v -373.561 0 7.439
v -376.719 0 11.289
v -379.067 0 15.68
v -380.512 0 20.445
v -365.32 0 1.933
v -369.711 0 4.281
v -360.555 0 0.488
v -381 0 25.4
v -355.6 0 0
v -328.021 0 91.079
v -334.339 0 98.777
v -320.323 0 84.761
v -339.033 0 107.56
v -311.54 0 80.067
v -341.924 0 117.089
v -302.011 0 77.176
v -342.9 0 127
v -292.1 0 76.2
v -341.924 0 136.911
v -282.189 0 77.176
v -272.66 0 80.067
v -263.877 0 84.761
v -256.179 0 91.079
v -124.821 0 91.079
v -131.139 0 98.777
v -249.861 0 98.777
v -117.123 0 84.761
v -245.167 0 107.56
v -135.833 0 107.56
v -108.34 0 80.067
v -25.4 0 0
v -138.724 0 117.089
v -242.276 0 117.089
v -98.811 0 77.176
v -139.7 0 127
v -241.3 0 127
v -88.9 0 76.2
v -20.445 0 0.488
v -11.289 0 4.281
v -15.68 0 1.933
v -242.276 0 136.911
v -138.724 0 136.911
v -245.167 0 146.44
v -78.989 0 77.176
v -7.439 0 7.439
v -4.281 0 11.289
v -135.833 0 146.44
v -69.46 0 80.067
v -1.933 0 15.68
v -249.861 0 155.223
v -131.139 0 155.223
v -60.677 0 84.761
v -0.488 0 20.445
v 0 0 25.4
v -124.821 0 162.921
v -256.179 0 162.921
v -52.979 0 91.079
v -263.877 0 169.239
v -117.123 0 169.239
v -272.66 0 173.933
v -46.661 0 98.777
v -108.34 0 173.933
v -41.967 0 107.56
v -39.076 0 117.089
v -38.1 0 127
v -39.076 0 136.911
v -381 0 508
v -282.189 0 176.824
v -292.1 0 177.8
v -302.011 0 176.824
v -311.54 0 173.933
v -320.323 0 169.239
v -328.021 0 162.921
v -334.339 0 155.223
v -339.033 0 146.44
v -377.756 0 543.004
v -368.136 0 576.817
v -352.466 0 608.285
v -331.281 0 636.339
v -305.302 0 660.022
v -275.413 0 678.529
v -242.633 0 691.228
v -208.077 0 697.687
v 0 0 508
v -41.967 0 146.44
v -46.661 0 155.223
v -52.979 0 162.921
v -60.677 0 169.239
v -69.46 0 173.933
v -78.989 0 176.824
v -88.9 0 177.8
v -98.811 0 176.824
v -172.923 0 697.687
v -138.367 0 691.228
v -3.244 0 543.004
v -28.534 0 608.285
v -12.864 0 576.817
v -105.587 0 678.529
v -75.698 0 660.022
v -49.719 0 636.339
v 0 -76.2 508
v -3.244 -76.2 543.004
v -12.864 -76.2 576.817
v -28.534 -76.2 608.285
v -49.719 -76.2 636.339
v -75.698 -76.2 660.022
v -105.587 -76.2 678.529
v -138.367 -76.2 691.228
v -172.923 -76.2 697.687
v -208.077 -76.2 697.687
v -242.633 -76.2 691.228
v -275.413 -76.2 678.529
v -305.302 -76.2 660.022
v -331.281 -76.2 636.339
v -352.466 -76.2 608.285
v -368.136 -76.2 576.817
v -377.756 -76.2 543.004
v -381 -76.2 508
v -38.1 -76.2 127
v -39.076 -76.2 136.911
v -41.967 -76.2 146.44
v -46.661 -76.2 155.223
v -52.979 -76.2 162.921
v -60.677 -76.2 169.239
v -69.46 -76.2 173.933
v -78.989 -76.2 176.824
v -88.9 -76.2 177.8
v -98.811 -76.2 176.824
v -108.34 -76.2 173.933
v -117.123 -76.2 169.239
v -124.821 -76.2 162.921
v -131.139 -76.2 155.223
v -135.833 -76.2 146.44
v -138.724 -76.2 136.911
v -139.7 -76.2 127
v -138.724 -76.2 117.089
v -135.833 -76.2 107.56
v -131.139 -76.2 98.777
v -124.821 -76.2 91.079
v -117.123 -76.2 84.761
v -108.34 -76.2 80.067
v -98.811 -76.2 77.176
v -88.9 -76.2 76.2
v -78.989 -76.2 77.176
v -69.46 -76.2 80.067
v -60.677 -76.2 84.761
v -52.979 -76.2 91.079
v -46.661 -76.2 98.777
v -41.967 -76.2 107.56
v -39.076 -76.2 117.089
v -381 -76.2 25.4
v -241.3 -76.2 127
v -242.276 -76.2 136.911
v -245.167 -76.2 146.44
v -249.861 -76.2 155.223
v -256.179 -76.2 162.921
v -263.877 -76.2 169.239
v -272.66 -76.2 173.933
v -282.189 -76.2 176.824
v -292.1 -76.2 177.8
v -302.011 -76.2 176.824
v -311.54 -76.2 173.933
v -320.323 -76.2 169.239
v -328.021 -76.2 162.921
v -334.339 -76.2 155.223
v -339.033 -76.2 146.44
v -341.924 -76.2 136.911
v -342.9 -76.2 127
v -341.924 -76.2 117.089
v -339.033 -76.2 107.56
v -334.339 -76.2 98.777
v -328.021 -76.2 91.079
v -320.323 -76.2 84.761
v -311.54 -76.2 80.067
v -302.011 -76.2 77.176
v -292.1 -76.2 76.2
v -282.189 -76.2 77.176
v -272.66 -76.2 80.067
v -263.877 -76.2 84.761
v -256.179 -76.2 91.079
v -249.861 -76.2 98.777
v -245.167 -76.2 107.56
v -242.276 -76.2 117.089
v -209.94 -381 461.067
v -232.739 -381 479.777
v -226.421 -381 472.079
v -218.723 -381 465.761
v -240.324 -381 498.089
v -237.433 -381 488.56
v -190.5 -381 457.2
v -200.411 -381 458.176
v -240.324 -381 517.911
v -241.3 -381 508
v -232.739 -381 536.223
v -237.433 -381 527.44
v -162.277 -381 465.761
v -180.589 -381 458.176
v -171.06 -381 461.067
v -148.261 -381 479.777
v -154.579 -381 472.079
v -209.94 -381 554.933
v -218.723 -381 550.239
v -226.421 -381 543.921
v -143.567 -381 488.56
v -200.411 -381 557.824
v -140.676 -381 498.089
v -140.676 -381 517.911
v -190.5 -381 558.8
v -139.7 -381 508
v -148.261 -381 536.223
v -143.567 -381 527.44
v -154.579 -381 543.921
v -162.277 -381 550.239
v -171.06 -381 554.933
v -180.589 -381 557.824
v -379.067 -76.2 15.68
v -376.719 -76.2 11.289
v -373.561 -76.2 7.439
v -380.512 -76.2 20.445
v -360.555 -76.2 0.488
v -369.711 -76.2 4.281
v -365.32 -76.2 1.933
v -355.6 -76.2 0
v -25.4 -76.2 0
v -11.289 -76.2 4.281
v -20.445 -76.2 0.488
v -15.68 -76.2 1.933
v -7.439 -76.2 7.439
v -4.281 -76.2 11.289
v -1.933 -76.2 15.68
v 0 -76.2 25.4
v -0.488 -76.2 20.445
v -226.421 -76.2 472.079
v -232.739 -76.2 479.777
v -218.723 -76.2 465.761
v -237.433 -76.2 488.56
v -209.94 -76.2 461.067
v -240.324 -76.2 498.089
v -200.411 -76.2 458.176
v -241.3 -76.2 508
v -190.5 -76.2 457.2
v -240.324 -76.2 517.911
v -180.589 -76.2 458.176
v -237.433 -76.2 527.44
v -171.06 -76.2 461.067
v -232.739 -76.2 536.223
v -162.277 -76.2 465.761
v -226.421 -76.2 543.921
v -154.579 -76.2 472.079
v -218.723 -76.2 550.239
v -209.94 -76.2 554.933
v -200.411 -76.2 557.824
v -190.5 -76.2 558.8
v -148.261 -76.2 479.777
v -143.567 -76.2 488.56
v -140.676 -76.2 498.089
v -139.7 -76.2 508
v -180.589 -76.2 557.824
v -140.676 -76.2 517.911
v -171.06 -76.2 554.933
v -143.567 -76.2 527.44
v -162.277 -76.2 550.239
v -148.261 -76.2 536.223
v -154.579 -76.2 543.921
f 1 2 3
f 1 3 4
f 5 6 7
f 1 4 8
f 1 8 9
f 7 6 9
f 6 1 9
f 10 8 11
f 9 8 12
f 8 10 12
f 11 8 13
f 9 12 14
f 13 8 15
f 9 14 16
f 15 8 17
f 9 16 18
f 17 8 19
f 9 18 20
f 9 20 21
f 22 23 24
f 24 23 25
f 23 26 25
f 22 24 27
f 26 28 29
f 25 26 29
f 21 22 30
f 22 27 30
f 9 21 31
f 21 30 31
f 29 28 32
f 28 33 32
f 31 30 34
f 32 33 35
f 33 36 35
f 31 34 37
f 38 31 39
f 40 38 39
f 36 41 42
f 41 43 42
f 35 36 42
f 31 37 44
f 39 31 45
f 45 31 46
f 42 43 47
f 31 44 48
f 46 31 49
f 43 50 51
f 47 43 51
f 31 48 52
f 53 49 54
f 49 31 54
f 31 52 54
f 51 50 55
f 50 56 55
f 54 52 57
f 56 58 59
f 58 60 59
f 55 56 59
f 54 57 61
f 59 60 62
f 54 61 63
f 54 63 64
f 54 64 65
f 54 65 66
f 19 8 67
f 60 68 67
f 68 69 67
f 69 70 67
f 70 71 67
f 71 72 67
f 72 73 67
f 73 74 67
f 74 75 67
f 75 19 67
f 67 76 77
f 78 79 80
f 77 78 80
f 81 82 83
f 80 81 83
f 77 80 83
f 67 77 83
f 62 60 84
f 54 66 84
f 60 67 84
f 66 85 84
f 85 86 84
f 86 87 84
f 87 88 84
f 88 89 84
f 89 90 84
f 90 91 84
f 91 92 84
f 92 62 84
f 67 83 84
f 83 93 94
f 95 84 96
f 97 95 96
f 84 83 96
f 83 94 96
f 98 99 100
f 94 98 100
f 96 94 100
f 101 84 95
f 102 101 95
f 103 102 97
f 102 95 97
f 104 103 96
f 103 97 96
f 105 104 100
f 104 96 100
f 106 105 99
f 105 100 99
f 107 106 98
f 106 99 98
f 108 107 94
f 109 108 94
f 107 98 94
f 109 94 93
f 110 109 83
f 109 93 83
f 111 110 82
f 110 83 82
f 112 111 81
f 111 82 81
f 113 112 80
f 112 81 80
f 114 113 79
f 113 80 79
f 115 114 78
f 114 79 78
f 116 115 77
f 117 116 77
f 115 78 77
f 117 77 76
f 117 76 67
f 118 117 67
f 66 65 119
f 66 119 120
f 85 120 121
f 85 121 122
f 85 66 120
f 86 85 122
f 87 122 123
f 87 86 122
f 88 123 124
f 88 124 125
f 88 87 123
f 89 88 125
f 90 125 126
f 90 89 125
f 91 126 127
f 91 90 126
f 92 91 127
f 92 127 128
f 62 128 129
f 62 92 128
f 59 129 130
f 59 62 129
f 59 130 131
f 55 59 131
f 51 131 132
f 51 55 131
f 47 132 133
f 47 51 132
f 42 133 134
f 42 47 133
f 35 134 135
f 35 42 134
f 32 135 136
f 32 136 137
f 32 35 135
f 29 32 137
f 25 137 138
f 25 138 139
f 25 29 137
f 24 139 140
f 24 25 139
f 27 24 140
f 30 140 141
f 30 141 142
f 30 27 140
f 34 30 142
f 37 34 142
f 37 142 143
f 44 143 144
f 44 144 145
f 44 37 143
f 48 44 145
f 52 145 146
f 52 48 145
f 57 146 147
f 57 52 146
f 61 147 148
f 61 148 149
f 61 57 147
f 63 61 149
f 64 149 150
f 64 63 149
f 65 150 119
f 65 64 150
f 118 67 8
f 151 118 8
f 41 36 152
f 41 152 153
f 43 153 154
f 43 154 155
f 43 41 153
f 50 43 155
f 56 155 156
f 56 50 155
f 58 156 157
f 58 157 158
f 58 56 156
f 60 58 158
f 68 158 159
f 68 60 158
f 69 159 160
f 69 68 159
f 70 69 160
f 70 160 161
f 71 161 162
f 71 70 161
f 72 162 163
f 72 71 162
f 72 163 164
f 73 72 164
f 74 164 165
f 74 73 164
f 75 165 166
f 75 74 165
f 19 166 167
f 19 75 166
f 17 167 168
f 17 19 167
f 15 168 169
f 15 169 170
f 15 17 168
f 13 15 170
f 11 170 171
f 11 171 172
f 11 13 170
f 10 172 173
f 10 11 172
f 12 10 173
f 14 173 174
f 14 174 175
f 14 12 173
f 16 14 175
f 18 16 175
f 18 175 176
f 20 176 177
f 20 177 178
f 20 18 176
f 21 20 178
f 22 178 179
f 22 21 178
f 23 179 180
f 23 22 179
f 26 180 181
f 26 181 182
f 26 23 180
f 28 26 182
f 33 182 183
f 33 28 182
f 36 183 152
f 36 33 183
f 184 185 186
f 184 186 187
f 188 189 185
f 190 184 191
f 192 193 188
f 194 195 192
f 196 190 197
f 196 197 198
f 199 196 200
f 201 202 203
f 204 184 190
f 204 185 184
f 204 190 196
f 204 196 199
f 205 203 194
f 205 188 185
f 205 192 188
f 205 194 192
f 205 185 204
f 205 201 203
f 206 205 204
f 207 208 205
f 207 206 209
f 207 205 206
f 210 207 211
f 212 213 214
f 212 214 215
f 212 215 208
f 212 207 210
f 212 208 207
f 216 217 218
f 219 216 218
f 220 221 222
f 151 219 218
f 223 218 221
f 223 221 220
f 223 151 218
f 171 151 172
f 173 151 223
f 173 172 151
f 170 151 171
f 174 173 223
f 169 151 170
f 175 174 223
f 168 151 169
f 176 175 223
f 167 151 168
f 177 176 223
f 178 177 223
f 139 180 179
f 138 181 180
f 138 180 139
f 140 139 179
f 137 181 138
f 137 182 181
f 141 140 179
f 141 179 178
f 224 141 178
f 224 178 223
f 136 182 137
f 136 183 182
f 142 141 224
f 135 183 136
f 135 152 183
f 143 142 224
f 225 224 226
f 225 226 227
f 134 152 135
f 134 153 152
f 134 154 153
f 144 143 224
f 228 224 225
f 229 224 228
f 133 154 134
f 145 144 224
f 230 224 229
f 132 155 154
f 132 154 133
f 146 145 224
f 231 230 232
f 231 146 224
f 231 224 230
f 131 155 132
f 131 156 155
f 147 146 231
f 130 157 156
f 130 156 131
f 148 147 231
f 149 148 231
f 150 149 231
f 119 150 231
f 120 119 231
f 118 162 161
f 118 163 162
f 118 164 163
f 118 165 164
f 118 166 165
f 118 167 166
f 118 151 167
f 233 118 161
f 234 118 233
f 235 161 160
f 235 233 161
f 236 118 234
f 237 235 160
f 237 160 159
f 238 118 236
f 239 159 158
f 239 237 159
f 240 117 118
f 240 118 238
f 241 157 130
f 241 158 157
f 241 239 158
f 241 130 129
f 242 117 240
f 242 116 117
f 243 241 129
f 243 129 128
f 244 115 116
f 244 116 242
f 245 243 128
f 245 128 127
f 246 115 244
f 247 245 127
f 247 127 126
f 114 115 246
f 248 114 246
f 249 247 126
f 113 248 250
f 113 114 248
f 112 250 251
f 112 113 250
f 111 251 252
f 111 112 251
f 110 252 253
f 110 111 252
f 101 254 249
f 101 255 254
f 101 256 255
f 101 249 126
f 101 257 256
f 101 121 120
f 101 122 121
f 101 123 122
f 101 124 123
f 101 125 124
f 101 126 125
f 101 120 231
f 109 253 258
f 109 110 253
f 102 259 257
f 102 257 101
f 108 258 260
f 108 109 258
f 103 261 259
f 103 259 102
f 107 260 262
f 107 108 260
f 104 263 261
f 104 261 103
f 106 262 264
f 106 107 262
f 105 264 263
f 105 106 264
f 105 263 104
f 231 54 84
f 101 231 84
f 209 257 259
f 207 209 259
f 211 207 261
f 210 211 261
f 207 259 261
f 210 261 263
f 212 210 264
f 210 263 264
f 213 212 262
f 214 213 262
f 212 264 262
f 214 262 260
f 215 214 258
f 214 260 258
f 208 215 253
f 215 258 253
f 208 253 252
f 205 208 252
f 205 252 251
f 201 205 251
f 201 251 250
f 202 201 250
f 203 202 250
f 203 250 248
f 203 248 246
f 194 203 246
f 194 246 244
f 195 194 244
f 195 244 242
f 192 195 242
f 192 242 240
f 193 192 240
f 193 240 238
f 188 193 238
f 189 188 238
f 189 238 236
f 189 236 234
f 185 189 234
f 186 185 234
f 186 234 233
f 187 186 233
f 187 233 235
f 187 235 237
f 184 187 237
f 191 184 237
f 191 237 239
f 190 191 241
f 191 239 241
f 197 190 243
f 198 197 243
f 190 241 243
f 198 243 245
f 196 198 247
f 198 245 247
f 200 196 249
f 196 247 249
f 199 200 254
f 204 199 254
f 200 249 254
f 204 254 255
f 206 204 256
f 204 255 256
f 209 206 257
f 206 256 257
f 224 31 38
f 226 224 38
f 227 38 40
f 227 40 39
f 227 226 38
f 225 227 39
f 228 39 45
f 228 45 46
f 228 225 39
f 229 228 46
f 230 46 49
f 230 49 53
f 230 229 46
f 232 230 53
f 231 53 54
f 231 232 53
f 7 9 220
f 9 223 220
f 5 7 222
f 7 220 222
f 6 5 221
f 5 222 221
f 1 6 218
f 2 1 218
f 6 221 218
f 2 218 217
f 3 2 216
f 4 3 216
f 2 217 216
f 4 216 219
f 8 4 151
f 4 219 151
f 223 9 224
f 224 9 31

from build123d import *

# Parameters (mm, degrees)
F0_R     = 50.8
F1_DEPTH = 76.2
F2_DEPTH = 381
F3_R     = 25.4


with BuildPart() as f1:
    # F0 (on Front) → F1 (new body)
    with BuildSketch(Plane.XZ):
        with BuildLine():
            Line((-381, 0), (0, 0))
            Line((0, 0), (0, 508))
            ThreePointArc((0, 508), (-190.5, 698.5), (-381, 508))
            Line((-381, 508), (-381, 0))
        make_face()
        with Locations((-292.1, 127)):
            Circle(F0_R, mode=Mode.SUBTRACT)
        with Locations((-88.9, 127)):
            Circle(F0_R, mode=Mode.SUBTRACT)
        with Locations((-190.5, 508)):
            Circle(F0_R, mode=Mode.SUBTRACT)
    extrude(amount=F1_DEPTH)

    # F0 (on Front) → F2 (join)
    with BuildSketch(Plane.XZ):
        with Locations((-190.5, 508)):
            Circle(F0_R)
    extrude(amount=F2_DEPTH)

    # F3
    f3_edges = [f1.edges().sort_by_distance(p)[0] for p in [
        (-381, -38.1, 0),
        (0, -38.1, 0),
    ]]
    fillet(f3_edges, radius=F3_R)


solid = f1.part
